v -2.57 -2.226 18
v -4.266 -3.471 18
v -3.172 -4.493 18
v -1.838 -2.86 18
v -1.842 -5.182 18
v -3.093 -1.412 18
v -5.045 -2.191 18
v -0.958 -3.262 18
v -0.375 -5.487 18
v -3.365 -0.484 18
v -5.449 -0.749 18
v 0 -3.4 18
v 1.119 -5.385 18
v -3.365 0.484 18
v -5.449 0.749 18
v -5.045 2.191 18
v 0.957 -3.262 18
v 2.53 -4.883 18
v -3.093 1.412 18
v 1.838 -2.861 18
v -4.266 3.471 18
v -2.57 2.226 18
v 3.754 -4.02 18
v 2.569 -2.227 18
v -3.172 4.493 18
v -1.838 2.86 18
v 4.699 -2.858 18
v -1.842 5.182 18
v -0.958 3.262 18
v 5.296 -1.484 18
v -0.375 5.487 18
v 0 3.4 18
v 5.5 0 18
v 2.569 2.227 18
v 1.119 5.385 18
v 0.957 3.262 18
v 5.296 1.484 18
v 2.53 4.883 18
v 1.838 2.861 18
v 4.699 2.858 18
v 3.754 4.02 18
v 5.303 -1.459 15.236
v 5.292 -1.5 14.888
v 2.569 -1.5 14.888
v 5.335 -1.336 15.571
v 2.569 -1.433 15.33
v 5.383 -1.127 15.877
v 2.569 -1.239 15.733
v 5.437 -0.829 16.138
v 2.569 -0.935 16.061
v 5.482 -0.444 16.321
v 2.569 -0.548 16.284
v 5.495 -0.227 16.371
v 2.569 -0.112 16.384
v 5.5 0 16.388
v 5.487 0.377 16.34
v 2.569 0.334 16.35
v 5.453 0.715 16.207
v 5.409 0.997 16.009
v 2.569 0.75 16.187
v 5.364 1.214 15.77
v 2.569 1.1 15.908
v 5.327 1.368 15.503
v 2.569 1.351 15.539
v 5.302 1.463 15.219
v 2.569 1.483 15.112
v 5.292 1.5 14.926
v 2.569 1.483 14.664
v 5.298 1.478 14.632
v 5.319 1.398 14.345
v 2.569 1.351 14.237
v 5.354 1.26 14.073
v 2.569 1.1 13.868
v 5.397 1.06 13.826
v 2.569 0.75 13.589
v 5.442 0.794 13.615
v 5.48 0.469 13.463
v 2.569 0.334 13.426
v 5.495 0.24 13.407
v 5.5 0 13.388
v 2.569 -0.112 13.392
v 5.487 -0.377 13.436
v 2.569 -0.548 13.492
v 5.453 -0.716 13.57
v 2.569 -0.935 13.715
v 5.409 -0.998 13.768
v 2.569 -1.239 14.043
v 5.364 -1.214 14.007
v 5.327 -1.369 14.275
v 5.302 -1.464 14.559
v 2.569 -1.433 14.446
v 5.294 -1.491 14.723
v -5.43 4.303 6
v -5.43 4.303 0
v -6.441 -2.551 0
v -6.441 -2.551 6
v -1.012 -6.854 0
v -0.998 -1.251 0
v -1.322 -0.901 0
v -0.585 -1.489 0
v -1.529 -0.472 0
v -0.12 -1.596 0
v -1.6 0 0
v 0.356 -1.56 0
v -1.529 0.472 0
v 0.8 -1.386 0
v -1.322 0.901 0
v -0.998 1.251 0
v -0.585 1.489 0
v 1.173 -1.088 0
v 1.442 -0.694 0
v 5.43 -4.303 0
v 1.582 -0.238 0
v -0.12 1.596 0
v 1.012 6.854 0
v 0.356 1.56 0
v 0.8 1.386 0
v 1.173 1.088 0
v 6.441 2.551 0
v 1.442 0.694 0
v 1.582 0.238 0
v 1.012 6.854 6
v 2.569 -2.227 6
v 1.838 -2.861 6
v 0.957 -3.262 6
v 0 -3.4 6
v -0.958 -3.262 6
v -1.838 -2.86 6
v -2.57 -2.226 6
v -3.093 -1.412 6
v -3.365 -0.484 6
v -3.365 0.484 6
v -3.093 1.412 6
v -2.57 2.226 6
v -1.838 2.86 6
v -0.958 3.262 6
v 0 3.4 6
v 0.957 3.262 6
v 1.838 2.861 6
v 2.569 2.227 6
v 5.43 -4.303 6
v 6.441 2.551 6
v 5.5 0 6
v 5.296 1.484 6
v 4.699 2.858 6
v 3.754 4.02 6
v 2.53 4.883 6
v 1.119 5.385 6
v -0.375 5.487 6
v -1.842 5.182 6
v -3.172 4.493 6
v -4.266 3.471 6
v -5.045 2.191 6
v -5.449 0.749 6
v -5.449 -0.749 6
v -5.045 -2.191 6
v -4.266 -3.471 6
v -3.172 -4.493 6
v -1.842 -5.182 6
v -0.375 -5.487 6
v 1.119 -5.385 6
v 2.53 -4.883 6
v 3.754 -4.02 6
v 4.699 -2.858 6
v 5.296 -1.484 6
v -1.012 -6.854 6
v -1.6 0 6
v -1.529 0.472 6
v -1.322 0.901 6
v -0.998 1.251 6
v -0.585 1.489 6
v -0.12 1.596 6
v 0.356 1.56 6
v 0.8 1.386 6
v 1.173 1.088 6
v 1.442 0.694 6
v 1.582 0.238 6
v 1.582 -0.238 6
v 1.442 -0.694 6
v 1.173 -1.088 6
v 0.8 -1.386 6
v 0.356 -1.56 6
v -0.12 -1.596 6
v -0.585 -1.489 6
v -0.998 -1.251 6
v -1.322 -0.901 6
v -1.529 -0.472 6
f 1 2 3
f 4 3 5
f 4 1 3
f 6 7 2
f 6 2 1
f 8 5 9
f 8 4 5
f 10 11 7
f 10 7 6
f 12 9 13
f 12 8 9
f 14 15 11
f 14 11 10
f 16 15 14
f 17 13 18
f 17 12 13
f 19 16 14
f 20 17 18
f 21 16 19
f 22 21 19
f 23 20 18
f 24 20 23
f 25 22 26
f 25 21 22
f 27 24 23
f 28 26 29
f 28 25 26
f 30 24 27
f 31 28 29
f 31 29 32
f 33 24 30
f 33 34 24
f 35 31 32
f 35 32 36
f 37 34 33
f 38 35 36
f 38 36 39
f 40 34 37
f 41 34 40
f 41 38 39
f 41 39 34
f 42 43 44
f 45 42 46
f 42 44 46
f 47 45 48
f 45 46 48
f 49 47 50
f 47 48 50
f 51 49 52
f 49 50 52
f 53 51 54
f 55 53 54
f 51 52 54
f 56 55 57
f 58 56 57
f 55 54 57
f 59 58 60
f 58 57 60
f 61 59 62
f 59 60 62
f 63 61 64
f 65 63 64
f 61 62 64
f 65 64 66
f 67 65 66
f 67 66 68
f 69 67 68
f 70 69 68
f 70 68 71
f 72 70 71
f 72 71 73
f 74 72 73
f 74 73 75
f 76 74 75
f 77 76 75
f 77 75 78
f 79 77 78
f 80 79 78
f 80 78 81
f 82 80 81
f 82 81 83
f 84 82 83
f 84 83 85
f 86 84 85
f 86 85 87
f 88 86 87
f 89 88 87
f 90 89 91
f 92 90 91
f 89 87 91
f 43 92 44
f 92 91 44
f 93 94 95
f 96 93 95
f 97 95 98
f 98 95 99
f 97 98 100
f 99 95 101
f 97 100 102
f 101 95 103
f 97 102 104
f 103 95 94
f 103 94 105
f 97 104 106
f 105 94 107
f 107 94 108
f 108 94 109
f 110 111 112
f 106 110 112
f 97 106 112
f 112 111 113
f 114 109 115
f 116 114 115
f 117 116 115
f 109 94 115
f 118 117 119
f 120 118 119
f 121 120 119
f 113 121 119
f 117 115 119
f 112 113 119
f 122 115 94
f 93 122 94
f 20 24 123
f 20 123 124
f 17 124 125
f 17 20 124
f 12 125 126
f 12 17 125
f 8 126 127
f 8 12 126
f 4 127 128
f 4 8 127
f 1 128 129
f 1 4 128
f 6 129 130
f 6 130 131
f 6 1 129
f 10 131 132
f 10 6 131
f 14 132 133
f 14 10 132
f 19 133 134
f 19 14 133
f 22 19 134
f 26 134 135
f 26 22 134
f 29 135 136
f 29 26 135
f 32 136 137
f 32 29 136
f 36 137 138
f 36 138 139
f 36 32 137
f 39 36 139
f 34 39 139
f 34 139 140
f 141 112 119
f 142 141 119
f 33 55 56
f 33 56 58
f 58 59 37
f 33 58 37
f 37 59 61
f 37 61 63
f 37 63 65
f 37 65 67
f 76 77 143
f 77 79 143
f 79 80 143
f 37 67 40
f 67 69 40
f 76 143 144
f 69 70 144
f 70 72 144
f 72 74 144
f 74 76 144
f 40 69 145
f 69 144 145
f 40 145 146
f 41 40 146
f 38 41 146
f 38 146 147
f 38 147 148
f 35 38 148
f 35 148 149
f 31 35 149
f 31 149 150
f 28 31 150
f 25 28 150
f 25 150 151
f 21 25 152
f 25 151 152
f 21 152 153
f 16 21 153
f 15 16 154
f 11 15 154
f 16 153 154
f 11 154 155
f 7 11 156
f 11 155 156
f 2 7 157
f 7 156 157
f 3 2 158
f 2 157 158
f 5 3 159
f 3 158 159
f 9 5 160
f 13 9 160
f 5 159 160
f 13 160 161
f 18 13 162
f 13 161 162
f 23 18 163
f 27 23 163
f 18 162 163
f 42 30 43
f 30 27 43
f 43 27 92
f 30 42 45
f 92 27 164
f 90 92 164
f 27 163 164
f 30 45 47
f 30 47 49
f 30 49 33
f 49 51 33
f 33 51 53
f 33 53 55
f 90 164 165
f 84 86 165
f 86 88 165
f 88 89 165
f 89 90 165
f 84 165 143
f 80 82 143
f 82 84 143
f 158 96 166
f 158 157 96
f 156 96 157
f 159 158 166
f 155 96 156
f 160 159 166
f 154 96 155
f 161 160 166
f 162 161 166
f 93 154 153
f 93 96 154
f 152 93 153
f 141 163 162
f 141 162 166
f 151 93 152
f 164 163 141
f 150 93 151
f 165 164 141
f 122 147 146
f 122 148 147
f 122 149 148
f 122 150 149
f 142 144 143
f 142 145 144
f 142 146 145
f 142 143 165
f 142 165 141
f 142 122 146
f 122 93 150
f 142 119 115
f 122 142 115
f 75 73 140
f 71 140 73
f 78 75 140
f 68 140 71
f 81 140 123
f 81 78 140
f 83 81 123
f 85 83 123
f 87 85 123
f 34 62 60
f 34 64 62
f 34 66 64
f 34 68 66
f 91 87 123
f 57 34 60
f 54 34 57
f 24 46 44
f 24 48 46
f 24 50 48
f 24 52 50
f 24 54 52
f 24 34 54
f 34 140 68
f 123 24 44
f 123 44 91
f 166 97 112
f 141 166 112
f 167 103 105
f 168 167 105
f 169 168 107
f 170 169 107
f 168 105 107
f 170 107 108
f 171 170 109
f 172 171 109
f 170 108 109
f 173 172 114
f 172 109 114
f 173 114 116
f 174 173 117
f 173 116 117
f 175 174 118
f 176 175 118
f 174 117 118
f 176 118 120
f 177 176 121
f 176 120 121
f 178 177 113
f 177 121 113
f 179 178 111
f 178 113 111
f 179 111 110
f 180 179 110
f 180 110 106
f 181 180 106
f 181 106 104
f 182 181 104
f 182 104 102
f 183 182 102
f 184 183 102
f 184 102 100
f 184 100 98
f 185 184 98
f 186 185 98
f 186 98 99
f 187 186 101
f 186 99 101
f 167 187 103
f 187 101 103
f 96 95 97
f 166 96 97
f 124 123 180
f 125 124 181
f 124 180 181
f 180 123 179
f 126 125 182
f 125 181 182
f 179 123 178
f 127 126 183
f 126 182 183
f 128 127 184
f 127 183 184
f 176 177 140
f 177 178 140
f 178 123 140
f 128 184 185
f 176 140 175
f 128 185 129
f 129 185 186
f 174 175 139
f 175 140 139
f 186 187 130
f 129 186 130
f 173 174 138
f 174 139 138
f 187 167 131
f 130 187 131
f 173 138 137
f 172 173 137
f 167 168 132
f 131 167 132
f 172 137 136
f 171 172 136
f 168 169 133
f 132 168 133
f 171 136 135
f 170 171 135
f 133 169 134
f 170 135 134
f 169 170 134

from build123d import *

# Parameters (mm, degrees)
EXTRUDE_1_DEPTH     = 6
SKETCH_2_R          = 5.5
EXTRUDE_2_DEPTH     = 12
SKETCH_3_R          = 1.6
CUT_EXTRUDE_1_DEPTH = 6
CUT_EXTRUDE_2_DEPTH = 12
SKETCH_5_R          = 1.5
CUT_EXTRUDE_3_DEPTH = 10
CUT_EXTRUDE_4_DEPTH = 12


with BuildPart() as part:
    # 草图1 → 凸台-拉伸1 (new body)
    with BuildSketch(Plane.XY):
        Polygon((5.429941256, -4.302991745), (6.441470791, 2.550971196), (1.011529536, 6.853962941), (-5.429941256, 4.302991745), (-6.441470791, -2.550971196), (-1.011529536, -6.853962941), align=None)
    extrude(amount=EXTRUDE_1_DEPTH)

    # 草图2 → 凸台-拉伸2 (add)
    with BuildSketch(Plane.XY.offset(6)):
        Circle(SKETCH_2_R)
    extrude(amount=EXTRUDE_2_DEPTH)

    # 草图3 → 切除-拉伸1 (cut)
    with BuildSketch(Plane(origin=(0, 0, 0), x_dir=(-1, 0, 0), z_dir=(0, 0, -1))):
        Circle(SKETCH_3_R)
    extrude(amount=-CUT_EXTRUDE_1_DEPTH, mode=Mode.SUBTRACT)

    # 草图4 → 切除-拉伸2 (cut)
    with BuildSketch(Plane.XY.offset(18)):
        with BuildLine():
            Line((2.45, 1.731328969), (2.45, -1.731328969))
            ThreePointArc((2.45, -1.731328969), (-3, 0), (2.45, 1.731328969))
        make_face()
    extrude(amount=-CUT_EXTRUDE_2_DEPTH, mode=Mode.SUBTRACT)

    # 草图5 → 切除-拉伸3 (cut)
    with BuildSketch(Plane.ZY.offset(-2.45)):
        with Locations(Location((14.888016114, 0, 0), (0, 0, 270))):
            Circle(SKETCH_5_R)
    extrude(amount=-CUT_EXTRUDE_3_DEPTH, mode=Mode.SUBTRACT)

    # 草图6 → 切除-拉伸4 (cut)
    with BuildSketch(Plane.XY.offset(18)):
        with BuildLine():
            Line((2.569146545, 2.226990352), (2.569146545, -2.226990352))
            ThreePointArc((2.569146545, -2.226990352), (-3.4, 0), (2.569146545, 2.226990352))
        make_face()
    extrude(amount=-CUT_EXTRUDE_4_DEPTH, mode=Mode.SUBTRACT)


solid = part.part
